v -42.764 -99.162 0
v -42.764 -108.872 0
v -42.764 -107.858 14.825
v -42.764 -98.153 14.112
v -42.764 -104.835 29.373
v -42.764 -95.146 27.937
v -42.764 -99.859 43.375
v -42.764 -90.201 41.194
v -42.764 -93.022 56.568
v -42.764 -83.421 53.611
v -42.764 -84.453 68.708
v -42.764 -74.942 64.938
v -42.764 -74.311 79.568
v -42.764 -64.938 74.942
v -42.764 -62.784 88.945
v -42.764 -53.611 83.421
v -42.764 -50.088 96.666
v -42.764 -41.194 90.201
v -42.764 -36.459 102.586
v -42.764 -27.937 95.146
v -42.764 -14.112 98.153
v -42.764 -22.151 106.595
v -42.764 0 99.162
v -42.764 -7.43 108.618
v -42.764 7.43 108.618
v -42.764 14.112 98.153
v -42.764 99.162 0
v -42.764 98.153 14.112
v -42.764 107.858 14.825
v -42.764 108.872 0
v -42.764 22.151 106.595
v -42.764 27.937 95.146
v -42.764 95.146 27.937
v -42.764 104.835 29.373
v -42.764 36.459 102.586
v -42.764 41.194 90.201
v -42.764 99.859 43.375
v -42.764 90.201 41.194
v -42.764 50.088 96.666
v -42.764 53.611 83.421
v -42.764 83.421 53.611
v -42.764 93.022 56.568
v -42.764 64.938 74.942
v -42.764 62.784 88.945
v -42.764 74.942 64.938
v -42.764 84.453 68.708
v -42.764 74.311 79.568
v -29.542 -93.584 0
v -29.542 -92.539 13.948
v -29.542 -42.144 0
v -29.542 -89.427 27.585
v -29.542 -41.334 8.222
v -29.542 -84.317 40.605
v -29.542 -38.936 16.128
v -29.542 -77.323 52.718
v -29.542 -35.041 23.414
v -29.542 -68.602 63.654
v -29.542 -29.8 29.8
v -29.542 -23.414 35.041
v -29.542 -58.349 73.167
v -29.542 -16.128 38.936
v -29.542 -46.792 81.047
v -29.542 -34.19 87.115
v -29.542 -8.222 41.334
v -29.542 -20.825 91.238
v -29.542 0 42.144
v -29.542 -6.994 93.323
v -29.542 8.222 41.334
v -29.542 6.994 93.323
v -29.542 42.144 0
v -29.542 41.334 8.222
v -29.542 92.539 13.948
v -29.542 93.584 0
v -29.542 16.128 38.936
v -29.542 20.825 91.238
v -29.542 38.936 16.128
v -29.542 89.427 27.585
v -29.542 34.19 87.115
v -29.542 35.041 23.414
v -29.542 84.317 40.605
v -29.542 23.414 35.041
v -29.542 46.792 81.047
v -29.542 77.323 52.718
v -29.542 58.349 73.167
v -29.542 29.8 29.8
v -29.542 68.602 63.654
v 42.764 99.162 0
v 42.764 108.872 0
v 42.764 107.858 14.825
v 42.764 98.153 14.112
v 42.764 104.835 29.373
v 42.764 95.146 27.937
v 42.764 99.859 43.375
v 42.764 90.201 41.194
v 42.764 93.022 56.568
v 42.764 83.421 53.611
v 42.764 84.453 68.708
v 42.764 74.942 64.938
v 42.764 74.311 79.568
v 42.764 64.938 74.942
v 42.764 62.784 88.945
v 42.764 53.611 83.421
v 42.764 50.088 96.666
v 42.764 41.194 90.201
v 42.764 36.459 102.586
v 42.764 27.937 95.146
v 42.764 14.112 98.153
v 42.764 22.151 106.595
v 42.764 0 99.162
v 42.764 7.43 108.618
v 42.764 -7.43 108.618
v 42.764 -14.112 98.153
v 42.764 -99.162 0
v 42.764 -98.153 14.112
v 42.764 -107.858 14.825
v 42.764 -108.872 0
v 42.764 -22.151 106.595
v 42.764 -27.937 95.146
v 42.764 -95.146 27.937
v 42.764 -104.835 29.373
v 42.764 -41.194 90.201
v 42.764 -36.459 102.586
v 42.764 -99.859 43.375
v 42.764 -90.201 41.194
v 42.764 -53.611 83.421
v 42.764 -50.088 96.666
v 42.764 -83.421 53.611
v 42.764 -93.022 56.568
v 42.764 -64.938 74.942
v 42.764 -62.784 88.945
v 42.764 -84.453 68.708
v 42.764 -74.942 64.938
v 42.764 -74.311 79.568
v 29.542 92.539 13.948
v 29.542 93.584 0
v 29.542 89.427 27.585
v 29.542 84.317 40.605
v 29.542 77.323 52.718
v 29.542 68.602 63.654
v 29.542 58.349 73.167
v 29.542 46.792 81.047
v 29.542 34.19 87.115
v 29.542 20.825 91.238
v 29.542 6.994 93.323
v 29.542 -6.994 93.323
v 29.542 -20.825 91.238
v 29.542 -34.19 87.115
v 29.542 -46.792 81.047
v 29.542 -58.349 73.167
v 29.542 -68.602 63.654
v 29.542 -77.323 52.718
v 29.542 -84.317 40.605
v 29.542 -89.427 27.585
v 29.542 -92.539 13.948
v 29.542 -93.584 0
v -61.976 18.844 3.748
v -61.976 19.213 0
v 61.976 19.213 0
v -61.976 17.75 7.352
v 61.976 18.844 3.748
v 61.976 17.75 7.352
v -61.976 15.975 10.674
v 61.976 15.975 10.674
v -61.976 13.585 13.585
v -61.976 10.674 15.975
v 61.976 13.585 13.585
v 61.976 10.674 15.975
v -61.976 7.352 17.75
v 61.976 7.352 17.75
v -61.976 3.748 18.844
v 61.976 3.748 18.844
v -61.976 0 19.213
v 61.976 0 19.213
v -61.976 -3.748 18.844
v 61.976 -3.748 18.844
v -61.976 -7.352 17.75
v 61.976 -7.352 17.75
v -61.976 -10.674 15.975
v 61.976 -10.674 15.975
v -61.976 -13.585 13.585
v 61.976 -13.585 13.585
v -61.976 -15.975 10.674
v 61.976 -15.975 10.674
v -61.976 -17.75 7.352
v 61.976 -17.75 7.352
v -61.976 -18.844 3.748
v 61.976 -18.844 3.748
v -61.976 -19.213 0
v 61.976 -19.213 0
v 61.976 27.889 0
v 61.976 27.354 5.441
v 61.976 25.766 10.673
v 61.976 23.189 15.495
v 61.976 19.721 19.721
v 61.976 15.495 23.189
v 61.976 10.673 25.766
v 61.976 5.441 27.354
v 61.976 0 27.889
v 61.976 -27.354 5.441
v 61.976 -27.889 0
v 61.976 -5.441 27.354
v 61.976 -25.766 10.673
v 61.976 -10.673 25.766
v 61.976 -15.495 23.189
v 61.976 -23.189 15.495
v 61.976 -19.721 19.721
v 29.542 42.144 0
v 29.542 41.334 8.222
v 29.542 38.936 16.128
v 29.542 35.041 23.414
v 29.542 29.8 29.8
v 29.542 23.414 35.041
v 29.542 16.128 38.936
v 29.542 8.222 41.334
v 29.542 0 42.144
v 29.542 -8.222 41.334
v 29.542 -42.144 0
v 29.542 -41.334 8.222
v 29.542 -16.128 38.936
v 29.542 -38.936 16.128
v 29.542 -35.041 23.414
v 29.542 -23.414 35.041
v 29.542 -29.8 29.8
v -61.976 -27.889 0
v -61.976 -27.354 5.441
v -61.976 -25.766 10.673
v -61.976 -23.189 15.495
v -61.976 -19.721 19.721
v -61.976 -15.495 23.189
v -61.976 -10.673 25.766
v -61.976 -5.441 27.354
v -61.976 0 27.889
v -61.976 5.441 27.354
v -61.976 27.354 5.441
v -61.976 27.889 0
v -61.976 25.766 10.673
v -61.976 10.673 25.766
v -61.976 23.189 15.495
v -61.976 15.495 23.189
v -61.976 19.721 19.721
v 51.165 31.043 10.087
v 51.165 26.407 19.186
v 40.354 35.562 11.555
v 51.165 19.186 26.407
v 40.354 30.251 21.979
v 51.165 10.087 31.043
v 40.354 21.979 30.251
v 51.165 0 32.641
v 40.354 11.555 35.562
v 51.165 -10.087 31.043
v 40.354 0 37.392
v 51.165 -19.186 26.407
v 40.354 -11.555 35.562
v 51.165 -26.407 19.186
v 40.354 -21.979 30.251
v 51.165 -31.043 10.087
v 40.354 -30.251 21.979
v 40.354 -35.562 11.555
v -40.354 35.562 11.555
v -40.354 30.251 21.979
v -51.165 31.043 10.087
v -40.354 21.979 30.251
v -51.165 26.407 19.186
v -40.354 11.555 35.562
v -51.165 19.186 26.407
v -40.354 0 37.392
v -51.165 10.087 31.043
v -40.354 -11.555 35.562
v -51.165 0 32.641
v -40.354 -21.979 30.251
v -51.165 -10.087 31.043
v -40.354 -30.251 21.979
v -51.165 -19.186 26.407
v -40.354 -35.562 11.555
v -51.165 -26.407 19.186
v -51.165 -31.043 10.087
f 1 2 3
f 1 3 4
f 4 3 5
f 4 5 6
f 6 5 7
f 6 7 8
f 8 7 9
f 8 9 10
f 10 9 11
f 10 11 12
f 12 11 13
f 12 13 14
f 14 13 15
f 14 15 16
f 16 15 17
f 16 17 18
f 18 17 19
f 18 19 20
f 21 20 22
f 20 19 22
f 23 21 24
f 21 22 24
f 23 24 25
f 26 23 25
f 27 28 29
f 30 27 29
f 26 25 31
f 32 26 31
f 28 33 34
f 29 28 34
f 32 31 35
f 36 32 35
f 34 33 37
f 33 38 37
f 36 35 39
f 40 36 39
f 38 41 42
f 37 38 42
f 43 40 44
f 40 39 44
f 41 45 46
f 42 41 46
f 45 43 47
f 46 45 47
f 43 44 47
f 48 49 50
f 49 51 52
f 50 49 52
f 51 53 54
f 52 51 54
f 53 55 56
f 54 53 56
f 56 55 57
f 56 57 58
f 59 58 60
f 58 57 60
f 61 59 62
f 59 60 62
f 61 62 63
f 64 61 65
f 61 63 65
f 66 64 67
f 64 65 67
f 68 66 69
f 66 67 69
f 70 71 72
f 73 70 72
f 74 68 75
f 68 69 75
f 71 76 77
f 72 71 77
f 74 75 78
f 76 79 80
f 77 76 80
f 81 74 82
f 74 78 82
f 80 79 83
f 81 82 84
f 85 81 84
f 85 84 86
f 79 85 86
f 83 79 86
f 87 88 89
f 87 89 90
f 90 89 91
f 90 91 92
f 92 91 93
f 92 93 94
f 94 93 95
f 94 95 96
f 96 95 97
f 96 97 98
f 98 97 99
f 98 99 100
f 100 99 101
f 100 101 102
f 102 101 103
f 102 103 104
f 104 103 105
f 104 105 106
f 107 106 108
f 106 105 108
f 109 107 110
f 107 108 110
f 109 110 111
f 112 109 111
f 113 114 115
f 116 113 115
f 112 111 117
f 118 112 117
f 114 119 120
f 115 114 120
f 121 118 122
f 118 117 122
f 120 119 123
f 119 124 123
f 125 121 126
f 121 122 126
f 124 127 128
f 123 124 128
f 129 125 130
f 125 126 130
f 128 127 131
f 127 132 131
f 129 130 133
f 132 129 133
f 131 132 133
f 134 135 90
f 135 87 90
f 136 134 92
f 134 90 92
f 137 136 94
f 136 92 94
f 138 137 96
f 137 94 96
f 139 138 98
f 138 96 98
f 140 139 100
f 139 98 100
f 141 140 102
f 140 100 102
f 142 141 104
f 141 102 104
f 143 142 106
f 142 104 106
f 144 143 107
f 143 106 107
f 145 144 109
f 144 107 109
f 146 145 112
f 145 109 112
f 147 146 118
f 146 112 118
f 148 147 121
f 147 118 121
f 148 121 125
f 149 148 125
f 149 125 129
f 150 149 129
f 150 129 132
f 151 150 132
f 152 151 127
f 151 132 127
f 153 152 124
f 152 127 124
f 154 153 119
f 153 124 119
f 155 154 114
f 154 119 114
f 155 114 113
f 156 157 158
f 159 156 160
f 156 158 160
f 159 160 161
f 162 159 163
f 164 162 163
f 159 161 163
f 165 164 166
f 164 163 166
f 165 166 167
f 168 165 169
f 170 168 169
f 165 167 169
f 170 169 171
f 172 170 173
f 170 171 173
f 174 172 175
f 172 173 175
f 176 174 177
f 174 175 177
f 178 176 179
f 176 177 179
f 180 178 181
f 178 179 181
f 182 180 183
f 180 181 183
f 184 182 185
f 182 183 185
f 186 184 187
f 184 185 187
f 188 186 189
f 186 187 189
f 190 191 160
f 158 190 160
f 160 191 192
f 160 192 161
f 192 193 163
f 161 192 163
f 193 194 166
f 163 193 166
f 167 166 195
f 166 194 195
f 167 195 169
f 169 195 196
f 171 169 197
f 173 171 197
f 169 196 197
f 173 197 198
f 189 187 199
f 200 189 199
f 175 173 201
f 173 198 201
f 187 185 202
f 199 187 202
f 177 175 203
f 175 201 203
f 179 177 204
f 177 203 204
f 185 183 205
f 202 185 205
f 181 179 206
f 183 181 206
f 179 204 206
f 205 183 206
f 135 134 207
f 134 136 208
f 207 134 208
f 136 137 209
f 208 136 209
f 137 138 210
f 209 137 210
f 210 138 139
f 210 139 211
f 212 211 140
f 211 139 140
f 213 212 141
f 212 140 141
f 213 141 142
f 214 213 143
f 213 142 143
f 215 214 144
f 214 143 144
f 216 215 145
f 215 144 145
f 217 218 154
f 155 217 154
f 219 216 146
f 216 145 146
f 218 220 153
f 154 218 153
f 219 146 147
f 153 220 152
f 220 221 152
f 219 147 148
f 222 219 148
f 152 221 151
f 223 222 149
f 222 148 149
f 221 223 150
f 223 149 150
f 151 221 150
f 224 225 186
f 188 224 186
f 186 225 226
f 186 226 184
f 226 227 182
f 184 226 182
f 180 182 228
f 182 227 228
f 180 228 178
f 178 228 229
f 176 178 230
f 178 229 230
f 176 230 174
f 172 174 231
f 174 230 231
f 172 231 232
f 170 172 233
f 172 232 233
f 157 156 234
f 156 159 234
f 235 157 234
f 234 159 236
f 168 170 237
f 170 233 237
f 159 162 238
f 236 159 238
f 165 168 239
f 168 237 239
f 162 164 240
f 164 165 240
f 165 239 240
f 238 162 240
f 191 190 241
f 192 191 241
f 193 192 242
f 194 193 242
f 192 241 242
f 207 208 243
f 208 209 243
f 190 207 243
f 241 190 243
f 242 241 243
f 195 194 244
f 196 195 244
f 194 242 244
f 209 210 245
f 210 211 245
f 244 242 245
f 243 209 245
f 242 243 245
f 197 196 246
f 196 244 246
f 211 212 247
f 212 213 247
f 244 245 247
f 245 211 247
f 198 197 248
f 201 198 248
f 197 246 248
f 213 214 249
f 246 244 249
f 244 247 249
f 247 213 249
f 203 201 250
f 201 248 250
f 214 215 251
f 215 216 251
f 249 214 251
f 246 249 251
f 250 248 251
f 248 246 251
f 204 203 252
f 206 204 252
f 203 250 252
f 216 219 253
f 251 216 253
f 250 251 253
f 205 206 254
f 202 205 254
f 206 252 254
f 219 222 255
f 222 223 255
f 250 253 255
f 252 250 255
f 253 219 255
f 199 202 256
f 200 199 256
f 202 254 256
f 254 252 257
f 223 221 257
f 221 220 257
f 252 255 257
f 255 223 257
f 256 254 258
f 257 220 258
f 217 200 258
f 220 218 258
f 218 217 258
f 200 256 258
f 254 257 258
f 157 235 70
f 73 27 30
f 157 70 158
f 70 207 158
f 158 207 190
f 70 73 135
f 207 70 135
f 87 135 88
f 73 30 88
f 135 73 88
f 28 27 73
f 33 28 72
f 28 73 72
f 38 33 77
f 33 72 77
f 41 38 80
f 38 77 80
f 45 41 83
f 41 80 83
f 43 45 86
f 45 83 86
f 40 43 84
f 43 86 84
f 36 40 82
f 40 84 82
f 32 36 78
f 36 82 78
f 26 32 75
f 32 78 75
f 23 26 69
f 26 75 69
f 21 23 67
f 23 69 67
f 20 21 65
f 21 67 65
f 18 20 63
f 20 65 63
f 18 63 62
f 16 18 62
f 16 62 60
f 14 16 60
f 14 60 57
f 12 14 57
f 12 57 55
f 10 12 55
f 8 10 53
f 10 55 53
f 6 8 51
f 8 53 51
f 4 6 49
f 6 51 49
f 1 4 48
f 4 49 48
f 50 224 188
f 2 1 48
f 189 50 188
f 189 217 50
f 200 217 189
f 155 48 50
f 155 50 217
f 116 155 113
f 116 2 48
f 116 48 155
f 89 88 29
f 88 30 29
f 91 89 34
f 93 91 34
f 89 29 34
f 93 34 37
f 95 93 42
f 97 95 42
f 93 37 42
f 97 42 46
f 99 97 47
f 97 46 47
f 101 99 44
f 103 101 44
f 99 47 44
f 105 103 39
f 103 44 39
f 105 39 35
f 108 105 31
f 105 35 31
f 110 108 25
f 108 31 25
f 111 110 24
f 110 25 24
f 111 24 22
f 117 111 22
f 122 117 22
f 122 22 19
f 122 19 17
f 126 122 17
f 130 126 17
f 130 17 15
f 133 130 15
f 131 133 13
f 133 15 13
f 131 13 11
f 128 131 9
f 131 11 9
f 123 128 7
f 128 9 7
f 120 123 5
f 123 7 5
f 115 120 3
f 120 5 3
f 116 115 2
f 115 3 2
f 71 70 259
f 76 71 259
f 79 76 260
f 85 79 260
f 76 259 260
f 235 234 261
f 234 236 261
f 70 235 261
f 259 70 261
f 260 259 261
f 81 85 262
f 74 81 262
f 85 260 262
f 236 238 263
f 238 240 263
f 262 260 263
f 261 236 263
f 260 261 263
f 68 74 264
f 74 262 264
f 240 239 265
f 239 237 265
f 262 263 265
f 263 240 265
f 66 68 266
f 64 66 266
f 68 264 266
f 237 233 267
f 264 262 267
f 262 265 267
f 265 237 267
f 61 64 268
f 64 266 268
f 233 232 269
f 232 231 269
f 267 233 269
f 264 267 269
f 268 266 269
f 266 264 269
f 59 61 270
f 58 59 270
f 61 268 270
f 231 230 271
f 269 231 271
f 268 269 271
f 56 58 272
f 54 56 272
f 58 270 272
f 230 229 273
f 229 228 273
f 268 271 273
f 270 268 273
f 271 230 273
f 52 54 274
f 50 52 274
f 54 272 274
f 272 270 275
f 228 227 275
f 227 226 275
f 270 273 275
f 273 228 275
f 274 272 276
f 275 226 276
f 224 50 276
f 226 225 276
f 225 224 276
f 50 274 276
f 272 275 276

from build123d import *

# Parameters (mm, degrees)
REVOLVE_1_ANGLE = 180


with BuildPart() as part:
    # 草图1 → 旋转1 (revolve)
    with BuildSketch(Plane.XY):
        Polygon((-61.976468087, 19.212705107), (61.976468087, 19.212705107), (61.976468087, 27.889410639), (29.542116455, 42.143998299), (29.542116455, 93.584466811), (42.76376298, 99.162348939), (42.76376298, 108.871995605), (-42.76376298, 108.871995605), (-42.76376298, 99.162348939), (-29.542116455, 93.584466811), (-29.542116455, 42.143998299), (-61.976468087, 27.889410639), align=None)
    revolve(axis=Axis((0, 0, 0), (1, 0, 0)), revolution_arc=REVOLVE_1_ANGLE)


solid = part.part
